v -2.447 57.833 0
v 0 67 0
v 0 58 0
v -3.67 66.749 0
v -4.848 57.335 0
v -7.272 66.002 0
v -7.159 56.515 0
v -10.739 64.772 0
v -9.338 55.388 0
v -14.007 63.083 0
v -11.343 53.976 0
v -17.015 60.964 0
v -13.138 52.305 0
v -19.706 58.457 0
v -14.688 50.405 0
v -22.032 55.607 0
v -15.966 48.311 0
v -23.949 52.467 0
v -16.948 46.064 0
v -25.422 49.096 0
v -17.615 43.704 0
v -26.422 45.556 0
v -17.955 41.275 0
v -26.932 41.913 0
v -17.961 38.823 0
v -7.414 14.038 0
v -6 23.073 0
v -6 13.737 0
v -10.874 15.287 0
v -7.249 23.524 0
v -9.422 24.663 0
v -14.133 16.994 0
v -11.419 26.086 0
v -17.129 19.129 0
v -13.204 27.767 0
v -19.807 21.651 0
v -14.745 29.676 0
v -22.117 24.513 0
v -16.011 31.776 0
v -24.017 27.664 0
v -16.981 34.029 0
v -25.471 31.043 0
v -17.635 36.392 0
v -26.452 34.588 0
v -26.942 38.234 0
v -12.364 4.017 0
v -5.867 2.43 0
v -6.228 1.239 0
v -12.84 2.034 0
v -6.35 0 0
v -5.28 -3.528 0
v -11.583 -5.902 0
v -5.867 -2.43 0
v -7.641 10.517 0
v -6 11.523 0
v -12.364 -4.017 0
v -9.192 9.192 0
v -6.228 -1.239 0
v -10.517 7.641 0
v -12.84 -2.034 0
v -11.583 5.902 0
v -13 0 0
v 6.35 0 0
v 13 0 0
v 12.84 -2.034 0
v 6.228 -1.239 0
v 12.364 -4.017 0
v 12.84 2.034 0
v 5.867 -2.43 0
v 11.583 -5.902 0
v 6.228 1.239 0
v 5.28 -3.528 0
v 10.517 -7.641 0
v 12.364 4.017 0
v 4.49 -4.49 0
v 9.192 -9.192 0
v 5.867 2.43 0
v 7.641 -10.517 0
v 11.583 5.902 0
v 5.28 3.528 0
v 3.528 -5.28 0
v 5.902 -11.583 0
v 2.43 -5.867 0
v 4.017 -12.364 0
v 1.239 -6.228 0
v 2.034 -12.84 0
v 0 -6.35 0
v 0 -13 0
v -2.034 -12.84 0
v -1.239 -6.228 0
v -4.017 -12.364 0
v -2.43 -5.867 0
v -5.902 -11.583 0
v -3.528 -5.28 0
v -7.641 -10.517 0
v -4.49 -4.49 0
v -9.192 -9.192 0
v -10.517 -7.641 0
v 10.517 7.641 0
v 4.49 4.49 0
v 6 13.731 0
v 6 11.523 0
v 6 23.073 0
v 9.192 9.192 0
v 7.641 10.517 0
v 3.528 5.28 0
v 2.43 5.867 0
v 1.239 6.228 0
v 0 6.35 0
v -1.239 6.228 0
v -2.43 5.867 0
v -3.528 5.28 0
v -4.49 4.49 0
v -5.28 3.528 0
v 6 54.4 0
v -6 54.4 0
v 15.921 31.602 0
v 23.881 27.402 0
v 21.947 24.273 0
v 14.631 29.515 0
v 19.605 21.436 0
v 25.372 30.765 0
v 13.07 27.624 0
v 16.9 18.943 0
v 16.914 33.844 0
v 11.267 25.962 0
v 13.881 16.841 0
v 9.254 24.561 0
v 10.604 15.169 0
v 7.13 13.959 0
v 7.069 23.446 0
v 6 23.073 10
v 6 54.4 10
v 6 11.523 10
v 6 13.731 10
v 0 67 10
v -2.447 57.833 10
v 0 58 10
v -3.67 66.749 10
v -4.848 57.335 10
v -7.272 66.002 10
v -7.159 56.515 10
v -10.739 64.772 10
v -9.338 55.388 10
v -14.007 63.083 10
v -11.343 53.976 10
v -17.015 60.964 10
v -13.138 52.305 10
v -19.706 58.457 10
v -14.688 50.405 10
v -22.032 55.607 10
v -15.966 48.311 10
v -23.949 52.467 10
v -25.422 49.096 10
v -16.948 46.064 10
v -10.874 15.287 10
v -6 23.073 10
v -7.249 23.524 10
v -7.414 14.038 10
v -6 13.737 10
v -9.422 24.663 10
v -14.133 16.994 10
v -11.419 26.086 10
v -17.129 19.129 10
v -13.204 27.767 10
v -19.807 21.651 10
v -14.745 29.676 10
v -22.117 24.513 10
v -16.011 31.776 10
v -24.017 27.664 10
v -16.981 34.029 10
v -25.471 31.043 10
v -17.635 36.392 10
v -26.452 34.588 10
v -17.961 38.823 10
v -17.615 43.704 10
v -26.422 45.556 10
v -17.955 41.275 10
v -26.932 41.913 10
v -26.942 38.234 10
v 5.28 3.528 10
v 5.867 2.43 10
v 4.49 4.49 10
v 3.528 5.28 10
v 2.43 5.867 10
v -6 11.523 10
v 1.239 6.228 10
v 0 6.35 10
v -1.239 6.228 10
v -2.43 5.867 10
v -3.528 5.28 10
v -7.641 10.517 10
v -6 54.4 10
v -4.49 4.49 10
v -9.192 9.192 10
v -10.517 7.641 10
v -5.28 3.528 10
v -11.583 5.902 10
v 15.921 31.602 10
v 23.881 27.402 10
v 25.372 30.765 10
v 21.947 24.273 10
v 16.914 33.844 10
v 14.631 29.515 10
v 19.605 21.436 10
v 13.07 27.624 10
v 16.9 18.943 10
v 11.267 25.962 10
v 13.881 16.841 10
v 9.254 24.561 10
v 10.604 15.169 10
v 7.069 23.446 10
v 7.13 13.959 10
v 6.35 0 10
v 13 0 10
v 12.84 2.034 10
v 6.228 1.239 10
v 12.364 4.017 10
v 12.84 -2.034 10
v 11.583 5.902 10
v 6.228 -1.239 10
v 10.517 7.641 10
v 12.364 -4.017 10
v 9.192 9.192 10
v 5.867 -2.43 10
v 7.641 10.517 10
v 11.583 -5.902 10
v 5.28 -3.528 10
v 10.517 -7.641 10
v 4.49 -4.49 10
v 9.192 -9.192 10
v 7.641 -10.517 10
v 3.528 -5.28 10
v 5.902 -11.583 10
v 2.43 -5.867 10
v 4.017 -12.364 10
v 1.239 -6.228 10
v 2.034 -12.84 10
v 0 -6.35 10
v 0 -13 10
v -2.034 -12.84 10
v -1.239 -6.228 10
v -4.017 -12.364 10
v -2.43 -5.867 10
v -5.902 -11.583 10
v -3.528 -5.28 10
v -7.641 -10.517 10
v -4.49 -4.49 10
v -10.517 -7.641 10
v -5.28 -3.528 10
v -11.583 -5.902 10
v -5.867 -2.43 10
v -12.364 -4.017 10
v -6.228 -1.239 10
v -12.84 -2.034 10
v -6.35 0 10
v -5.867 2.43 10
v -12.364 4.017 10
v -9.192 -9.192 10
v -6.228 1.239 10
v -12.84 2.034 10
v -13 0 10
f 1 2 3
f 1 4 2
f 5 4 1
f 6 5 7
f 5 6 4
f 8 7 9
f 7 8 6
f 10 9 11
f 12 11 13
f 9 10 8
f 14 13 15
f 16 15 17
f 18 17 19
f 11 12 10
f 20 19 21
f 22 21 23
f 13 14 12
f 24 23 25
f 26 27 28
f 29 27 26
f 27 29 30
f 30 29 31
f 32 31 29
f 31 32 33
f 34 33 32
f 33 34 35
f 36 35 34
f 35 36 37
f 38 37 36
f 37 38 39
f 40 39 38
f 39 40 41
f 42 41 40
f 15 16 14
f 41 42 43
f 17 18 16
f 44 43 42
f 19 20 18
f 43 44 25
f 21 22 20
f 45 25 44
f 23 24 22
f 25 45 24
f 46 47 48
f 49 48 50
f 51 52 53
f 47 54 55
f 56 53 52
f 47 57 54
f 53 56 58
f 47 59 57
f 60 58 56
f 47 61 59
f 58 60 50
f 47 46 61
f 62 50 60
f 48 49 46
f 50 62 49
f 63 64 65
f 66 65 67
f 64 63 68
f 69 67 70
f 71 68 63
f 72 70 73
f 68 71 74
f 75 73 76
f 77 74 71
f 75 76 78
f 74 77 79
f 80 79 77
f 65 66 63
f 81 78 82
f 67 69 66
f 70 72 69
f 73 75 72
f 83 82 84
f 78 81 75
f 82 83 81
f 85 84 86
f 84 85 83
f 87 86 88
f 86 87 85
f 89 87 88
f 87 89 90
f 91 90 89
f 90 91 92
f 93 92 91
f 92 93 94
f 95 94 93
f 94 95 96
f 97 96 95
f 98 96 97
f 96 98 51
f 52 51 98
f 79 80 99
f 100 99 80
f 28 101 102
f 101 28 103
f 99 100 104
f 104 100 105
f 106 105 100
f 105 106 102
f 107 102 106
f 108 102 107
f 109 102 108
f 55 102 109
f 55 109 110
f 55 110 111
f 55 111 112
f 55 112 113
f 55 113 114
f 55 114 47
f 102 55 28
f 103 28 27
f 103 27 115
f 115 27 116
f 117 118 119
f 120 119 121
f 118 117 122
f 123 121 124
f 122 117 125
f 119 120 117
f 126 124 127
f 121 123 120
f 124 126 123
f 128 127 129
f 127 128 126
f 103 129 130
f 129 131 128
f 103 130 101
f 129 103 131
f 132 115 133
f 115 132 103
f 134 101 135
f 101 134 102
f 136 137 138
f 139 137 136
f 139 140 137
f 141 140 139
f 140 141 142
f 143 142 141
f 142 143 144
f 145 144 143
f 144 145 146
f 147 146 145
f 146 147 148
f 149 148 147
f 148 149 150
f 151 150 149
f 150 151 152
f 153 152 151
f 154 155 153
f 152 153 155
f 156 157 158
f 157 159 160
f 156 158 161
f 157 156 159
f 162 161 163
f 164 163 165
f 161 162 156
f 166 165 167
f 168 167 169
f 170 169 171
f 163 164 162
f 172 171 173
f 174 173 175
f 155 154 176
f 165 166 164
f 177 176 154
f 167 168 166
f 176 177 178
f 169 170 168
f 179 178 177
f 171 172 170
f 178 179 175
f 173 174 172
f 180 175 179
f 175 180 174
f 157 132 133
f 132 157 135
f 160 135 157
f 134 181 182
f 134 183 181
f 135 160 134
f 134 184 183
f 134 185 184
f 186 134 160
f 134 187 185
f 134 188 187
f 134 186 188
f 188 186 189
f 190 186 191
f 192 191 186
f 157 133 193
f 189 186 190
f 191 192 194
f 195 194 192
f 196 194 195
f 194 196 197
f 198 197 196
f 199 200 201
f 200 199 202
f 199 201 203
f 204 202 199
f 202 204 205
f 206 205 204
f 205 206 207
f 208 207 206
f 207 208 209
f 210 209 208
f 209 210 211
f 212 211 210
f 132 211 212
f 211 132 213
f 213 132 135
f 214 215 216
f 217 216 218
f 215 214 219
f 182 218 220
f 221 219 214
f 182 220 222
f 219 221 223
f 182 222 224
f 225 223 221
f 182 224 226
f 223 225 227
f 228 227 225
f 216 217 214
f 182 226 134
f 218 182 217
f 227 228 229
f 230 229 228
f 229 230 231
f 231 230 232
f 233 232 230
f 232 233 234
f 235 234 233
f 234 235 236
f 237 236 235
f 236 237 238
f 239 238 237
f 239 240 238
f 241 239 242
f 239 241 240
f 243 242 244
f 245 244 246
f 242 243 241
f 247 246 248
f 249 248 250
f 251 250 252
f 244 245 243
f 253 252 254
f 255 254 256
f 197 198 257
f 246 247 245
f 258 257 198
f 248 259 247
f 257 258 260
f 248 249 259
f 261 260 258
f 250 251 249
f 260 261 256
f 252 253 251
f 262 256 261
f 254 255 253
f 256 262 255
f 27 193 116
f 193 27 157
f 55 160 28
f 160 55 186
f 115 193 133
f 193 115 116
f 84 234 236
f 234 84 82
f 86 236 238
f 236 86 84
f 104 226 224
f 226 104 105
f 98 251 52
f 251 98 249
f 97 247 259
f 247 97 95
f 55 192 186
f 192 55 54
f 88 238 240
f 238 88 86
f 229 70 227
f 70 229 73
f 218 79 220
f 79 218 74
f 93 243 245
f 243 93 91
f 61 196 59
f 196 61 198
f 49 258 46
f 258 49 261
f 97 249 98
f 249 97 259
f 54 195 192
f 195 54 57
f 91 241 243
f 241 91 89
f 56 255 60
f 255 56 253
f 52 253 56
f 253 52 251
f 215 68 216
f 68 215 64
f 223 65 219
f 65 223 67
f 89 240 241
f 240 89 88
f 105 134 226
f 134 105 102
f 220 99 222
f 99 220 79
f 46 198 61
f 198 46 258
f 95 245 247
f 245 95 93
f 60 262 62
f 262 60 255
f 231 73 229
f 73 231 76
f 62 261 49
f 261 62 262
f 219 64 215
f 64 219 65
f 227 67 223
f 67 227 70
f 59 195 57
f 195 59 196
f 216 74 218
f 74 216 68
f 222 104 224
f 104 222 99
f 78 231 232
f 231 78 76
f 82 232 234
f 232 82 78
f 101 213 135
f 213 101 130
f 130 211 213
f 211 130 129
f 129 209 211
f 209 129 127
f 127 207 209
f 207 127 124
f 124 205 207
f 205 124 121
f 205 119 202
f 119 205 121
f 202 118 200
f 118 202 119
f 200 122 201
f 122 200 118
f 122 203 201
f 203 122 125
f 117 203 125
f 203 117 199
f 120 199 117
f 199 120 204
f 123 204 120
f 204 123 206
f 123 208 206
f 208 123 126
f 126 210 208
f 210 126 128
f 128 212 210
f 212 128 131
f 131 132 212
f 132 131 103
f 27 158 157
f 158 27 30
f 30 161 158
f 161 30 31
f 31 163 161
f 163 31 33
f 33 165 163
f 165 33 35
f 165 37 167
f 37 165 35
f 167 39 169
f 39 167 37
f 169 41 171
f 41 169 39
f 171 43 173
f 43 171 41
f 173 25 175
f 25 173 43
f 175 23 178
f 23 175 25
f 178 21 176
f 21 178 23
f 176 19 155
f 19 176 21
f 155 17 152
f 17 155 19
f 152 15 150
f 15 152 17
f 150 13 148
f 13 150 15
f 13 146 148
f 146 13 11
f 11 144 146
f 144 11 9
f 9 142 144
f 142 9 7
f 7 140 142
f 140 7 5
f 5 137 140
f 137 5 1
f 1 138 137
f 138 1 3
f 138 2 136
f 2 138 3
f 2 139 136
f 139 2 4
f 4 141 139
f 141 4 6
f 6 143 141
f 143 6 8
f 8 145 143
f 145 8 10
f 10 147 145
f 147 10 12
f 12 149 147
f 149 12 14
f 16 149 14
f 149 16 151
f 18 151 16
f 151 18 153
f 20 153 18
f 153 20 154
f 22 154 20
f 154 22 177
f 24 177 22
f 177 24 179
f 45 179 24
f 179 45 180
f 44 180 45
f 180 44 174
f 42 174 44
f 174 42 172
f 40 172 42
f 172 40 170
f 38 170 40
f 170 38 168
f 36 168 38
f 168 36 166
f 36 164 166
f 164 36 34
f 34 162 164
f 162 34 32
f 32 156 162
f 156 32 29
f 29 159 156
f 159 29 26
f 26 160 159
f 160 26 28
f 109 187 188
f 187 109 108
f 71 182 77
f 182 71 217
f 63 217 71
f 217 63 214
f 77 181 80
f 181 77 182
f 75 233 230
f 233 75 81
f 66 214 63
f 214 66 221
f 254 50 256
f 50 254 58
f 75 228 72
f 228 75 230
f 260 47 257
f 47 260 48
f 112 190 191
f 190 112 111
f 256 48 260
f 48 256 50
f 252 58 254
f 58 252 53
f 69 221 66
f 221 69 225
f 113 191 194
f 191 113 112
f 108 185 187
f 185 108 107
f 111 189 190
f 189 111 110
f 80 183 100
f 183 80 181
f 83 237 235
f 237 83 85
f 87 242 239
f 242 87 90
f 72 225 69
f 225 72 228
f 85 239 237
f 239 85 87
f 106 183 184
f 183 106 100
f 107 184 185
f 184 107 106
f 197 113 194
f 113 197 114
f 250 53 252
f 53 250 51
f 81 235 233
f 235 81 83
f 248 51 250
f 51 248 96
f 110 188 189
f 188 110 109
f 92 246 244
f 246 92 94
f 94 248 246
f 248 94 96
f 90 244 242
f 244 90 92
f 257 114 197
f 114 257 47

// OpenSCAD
$fn = 32;

// ----------------------------------------------------------------------
// Hook: 80 mm shank into a 18 mm curl, 10 mm thick
// ----------------------------------------------------------------------

// --- parameters (mm) ---
shank_len = 80;           // shank length from the boss centre
shank_w = 12;             // shank width
boss_d = 26;              // boss diameter
bore_d = 12.7;            // boss bore
curl_in = 18;             // curl inner radius
curl_out = 27;            // curl outer radius
curl_sweep = 250;         // curl sweep angle
hook_t = 10;              // hook thickness

shank_profile = [[-6, 54.4], [6, 54.4], [6, 11], [-6, 11]];
boss_profile = [[13, 0], [12.84, 2.034], [12.364, 4.017], [11.583, 5.902], [10.517, 7.641], [9.192, 9.192], [7.641, 10.517], [5.902, 11.583], [4.017, 12.364], [2.034, 12.84], [0, 13], [-2.034, 12.84], [-4.017, 12.364], [-5.902, 11.583], [-7.641, 10.517], [-9.192, 9.192], [-10.517, 7.641], [-11.583, 5.902], [-12.364, 4.017], [-12.84, 2.034], [-13, 0], [-12.84, -2.034], [-12.364, -4.017], [-11.583, -5.902], [-10.517, -7.641], [-9.192, -9.192], [-7.641, -10.517], [-5.902, -11.583], [-4.017, -12.364], [-2.034, -12.84], [0, -13], [2.034, -12.84], [4.017, -12.364], [5.902, -11.583], [7.641, -10.517], [9.192, -9.192], [10.517, -7.641], [11.583, -5.902], [12.364, -4.017], [12.84, -2.034]];
curl_profile = [[0, 67], [-3.67, 66.749], [-7.272, 66.002], [-10.739, 64.772], [-14.007, 63.083], [-17.015, 60.964], [-19.706, 58.457], [-22.032, 55.607], [-23.949, 52.467], [-25.422, 49.096], [-26.422, 45.556], [-26.932, 41.913], [-26.942, 38.234], [-26.452, 34.588], [-25.471, 31.043], [-24.017, 27.664], [-22.117, 24.513], [-19.807, 21.651], [-17.129, 19.129], [-14.133, 16.994], [-10.874, 15.287], [-7.414, 14.038], [-3.816, 13.271], [-0.147, 13], [3.524, 13.231], [7.13, 13.959], [10.604, 15.169], [13.881, 16.841], [16.9, 18.943], [19.605, 21.436], [21.947, 24.273], [23.881, 27.402], [25.372, 30.765], [16.914, 33.844], [15.921, 31.602], [14.631, 29.515], [13.07, 27.624], [11.267, 25.962], [9.254, 24.561], [7.069, 23.446], [4.754, 22.639], [2.349, 22.154], [-0.098, 22], [-2.544, 22.181], [-4.943, 22.692], [-7.249, 23.524], [-9.422, 24.663], [-11.419, 26.086], [-13.204, 27.767], [-14.745, 29.676], [-16.011, 31.776], [-16.981, 34.029], [-17.635, 36.392], [-17.961, 38.823], [-17.955, 41.275], [-17.615, 43.704], [-16.948, 46.064], [-15.966, 48.311], [-14.688, 50.405], [-13.138, 52.305], [-11.343, 53.976], [-9.338, 55.388], [-7.159, 56.515], [-4.848, 57.335], [-2.447, 57.833], [0, 58]];

difference() {
  union() {
    /* three overlapping outlines: shank, boss and the smooth curl */
    linear_extrude(height = hook_t) polygon(shank_profile);
    linear_extrude(height = hook_t) polygon(boss_profile);
    linear_extrude(height = hook_t) polygon(curl_profile);
  }
  translate([0, 0, -2.5]) cylinder(h = hook_t + 5, d = bore_d);
}
